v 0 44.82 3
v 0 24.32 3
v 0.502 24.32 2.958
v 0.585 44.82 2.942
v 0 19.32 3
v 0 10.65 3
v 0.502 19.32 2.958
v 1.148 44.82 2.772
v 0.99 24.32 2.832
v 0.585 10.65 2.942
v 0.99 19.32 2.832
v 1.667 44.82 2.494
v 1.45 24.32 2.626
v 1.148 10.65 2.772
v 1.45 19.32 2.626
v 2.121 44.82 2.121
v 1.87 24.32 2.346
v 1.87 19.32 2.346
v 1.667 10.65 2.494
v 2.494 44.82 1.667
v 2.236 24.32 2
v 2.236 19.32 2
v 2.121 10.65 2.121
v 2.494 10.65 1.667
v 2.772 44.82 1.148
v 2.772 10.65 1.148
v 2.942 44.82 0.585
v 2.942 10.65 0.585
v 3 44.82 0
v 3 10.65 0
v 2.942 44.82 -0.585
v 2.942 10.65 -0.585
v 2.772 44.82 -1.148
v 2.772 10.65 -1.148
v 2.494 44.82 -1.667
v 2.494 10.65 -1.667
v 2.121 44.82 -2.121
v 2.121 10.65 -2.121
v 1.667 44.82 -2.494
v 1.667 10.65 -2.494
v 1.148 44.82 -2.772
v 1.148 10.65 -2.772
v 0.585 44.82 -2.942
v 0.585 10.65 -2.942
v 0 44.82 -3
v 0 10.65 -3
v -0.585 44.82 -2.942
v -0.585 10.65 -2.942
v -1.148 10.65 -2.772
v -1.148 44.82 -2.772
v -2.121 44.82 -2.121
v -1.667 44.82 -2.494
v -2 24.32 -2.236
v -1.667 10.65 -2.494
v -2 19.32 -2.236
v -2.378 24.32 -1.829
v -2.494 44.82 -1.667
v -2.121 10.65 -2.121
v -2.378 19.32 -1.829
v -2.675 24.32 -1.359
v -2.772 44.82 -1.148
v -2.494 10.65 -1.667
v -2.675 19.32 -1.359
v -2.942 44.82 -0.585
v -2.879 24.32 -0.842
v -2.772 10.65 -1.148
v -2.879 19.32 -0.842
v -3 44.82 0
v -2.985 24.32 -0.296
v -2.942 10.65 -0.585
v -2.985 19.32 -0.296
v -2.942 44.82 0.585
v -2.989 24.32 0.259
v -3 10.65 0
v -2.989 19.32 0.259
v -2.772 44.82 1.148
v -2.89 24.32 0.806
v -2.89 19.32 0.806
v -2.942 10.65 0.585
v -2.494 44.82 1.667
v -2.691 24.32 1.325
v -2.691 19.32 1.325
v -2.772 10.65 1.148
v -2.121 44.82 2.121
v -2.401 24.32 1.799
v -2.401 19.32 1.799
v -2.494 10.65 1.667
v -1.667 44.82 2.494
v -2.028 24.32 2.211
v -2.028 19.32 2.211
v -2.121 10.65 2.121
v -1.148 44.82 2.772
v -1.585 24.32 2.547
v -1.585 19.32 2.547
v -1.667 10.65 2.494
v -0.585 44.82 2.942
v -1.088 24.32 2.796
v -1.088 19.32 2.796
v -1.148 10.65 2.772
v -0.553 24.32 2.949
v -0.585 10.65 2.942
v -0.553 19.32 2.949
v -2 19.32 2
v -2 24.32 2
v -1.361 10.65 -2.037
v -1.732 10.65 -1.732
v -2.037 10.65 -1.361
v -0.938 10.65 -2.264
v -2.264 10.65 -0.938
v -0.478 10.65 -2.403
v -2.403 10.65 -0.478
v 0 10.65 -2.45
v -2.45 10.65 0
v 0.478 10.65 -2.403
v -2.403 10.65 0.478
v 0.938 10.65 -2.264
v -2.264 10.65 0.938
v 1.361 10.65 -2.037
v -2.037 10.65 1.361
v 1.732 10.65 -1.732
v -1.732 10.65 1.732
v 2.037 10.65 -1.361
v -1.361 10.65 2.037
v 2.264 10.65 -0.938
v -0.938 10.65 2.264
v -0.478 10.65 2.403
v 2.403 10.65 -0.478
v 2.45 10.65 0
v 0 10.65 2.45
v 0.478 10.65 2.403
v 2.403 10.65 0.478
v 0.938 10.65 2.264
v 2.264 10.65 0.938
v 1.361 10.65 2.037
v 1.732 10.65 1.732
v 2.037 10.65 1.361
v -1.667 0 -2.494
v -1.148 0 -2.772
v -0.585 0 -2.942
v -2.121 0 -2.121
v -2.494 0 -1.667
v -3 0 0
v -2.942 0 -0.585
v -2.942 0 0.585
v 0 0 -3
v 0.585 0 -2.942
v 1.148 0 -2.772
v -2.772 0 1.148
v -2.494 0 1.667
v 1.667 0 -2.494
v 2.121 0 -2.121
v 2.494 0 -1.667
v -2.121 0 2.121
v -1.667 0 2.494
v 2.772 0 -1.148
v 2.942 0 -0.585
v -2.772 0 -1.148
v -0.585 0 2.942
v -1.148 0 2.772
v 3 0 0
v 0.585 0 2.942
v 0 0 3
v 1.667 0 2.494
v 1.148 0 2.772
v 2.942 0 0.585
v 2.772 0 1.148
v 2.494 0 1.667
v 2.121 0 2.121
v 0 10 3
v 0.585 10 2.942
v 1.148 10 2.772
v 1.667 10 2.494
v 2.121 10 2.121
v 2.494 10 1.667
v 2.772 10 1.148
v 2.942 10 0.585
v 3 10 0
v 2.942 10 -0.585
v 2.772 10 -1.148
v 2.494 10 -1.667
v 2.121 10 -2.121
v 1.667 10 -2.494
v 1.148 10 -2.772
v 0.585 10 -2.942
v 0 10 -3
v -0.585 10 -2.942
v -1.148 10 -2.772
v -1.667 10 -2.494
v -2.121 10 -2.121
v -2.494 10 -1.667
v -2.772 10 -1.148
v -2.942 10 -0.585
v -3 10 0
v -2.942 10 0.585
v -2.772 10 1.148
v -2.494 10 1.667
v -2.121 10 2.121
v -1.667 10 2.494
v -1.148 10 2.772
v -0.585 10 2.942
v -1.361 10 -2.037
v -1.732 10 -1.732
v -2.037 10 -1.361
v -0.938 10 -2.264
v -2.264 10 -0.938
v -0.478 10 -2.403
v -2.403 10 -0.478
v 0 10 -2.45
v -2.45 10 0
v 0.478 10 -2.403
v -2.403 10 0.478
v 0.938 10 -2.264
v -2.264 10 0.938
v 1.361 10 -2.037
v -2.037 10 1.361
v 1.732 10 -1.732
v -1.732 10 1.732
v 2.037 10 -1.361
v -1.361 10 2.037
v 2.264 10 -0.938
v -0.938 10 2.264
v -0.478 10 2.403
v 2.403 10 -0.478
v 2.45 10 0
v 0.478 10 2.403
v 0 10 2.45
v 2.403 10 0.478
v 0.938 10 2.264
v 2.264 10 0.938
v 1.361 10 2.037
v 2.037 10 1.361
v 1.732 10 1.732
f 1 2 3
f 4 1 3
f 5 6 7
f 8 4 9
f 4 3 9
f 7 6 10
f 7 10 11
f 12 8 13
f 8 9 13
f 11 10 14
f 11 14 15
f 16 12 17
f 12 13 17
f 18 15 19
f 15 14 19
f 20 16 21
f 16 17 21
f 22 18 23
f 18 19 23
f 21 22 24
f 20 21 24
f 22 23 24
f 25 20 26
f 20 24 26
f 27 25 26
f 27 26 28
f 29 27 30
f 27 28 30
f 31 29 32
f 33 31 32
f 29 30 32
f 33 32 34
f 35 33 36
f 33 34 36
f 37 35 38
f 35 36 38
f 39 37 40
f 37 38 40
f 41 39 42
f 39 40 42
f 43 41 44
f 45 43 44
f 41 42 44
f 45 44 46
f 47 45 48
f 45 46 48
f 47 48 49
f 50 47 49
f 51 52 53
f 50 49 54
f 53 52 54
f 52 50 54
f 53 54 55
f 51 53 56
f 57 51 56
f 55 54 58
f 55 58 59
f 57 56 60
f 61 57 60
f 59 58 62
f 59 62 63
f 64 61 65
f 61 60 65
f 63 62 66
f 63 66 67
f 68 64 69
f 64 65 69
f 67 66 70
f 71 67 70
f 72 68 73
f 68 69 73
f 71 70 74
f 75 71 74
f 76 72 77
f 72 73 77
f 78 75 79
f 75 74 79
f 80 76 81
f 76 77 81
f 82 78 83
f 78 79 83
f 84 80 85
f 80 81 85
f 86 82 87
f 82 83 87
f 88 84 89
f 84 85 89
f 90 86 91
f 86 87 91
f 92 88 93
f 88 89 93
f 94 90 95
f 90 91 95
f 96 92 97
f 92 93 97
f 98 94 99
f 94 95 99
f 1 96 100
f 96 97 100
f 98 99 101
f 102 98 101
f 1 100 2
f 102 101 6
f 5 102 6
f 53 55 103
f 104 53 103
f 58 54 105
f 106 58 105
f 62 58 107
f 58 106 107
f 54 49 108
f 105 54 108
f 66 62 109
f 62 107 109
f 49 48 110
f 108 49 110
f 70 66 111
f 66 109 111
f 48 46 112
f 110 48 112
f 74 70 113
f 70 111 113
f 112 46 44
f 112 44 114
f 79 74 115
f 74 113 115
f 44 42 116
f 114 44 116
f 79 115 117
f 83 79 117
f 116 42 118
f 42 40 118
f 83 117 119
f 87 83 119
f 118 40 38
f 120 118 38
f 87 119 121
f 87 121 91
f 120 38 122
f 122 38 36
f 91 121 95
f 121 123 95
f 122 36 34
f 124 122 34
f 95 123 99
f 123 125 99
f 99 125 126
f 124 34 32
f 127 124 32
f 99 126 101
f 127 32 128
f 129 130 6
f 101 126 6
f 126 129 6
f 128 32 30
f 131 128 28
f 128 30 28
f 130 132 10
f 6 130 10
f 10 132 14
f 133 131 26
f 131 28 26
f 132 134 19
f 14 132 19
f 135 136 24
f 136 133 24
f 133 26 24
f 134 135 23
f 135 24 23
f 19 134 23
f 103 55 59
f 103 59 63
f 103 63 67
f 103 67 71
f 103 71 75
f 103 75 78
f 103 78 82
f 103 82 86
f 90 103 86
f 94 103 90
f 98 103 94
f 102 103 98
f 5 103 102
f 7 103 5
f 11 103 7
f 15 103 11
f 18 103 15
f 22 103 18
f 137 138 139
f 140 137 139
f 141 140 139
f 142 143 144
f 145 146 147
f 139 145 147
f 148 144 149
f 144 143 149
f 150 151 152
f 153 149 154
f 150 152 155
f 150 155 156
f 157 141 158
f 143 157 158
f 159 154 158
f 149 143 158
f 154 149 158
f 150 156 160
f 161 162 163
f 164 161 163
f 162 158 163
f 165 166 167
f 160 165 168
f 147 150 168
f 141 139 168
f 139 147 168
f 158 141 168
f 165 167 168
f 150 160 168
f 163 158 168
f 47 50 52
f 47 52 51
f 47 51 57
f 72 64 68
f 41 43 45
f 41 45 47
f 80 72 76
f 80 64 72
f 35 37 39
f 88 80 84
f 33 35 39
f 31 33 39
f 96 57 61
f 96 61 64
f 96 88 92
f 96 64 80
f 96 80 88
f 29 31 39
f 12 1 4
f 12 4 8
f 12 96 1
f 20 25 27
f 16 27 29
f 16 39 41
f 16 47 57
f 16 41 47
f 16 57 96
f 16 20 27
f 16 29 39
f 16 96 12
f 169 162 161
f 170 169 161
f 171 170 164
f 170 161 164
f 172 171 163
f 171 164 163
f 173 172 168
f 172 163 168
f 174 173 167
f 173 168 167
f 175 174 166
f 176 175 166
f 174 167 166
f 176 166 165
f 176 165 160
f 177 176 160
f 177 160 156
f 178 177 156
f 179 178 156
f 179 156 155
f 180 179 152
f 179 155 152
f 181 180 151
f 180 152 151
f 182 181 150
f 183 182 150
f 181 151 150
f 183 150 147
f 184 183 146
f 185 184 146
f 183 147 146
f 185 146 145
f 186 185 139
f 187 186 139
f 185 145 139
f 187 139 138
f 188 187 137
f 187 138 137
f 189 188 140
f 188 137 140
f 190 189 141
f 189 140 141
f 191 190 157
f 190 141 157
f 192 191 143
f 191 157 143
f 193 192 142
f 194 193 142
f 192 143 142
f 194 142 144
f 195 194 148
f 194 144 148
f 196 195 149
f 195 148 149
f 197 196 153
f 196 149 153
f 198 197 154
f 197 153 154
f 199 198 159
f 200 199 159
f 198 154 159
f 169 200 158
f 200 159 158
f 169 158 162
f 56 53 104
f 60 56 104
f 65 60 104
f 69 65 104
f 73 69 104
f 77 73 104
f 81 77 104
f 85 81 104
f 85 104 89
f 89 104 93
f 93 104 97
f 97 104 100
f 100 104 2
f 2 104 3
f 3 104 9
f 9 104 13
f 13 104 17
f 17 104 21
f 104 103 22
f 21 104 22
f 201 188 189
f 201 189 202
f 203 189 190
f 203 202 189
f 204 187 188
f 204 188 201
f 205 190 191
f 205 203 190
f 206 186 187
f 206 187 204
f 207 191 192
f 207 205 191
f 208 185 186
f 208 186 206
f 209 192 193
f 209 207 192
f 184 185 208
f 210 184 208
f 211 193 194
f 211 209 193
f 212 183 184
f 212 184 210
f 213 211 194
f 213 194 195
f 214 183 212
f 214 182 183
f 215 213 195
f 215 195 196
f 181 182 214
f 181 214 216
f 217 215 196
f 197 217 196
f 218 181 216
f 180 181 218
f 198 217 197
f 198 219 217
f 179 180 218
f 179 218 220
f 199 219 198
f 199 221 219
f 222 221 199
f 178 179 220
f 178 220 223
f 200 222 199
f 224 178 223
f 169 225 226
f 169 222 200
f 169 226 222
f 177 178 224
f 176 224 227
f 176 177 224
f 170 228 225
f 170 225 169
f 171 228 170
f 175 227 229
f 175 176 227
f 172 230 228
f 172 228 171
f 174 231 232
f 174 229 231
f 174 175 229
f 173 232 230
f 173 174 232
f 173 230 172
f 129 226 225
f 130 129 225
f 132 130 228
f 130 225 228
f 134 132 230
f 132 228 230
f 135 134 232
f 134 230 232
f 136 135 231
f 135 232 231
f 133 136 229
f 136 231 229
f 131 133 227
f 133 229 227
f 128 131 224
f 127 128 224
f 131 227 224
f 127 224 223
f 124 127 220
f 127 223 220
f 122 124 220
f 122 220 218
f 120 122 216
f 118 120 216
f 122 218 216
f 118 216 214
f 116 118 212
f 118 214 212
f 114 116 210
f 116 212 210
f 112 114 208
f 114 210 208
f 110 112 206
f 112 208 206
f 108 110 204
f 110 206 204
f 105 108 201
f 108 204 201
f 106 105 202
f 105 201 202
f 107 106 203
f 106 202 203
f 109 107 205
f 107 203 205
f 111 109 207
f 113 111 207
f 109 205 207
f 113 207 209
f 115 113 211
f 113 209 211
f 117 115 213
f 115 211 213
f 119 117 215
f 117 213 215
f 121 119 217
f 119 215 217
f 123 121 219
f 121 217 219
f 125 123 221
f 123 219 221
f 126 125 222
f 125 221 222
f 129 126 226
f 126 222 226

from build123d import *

# Parameters (mm, degrees)
SKETCH1_R           = 3
BOSS_EXTRUDE1_DEPTH = 10
SKETCH2_R           = 2.45
BOSS_EXTRUDE2_DEPTH = 0.65
SKETCH3_R           = 3
BOSS_EXTRUDE3_DEPTH = 8.67
BOSS_EXTRUDE4_DEPTH = 5
SKETCH5_R           = 3
BOSS_EXTRUDE5_DEPTH = 20.5


with BuildPart() as part:
    # Sketch1 → Boss-Extrude1 (new body)
    with BuildSketch(Plane(origin=(0, 0, 0), x_dir=(1, 0, 0), z_dir=(0, 1, 0))):
        with Locations(Location((0, 0, 0), (0, 0, 270))):
            Circle(SKETCH1_R)
    extrude(amount=BOSS_EXTRUDE1_DEPTH)

    # Sketch2 → Boss-Extrude2 (add)
    with BuildSketch(Plane(origin=(0, 10, 0), x_dir=(1, 0, 0), z_dir=(0, 1, 0))):
        with Locations(Location((0, 0, 0), (0, 0, 270))):
            Circle(SKETCH2_R)
    extrude(amount=BOSS_EXTRUDE2_DEPTH)

    # Sketch3 → Boss-Extrude3 (add)
    with BuildSketch(Plane(origin=(0, 10.65, 0), x_dir=(1, 0, 0), z_dir=(0, 1, 0))):
        with Locations(Location((0, 0, 0), (0, 0, 270))):
            Circle(SKETCH3_R)
    extrude(amount=BOSS_EXTRUDE3_DEPTH)

    # Sketch4 → Boss-Extrude4 (add)
    with BuildSketch(Plane(origin=(0, 19.32, 0), x_dir=(1, 0, 0), z_dir=(0, 1, 0))):
        with BuildLine():
            Line((-2, -2), (2.236067977, -2))
            ThreePointArc((2.236067977, -2), (2.802517077, -1.070466269), (3, 0))
            ThreePointArc((3, 0), (2.121320344, 2.121320344), (0, 3))
            ThreePointArc((0, 3), (-1.070466269, 2.802517077), (-2, 2.236067977))
            Line((-2, 2.236067977), (-2, -2))
        make_face()
    extrude(amount=BOSS_EXTRUDE4_DEPTH)

    # Sketch5 → Boss-Extrude5 (add)
    with BuildSketch(Plane(origin=(0, 24.32, 0), x_dir=(1, 0, 0), z_dir=(0, 1, 0))):
        with Locations(Location((0, 0, 0), (0, 0, 270))):
            Circle(SKETCH5_R)
    extrude(amount=BOSS_EXTRUDE5_DEPTH)


solid = part.part
